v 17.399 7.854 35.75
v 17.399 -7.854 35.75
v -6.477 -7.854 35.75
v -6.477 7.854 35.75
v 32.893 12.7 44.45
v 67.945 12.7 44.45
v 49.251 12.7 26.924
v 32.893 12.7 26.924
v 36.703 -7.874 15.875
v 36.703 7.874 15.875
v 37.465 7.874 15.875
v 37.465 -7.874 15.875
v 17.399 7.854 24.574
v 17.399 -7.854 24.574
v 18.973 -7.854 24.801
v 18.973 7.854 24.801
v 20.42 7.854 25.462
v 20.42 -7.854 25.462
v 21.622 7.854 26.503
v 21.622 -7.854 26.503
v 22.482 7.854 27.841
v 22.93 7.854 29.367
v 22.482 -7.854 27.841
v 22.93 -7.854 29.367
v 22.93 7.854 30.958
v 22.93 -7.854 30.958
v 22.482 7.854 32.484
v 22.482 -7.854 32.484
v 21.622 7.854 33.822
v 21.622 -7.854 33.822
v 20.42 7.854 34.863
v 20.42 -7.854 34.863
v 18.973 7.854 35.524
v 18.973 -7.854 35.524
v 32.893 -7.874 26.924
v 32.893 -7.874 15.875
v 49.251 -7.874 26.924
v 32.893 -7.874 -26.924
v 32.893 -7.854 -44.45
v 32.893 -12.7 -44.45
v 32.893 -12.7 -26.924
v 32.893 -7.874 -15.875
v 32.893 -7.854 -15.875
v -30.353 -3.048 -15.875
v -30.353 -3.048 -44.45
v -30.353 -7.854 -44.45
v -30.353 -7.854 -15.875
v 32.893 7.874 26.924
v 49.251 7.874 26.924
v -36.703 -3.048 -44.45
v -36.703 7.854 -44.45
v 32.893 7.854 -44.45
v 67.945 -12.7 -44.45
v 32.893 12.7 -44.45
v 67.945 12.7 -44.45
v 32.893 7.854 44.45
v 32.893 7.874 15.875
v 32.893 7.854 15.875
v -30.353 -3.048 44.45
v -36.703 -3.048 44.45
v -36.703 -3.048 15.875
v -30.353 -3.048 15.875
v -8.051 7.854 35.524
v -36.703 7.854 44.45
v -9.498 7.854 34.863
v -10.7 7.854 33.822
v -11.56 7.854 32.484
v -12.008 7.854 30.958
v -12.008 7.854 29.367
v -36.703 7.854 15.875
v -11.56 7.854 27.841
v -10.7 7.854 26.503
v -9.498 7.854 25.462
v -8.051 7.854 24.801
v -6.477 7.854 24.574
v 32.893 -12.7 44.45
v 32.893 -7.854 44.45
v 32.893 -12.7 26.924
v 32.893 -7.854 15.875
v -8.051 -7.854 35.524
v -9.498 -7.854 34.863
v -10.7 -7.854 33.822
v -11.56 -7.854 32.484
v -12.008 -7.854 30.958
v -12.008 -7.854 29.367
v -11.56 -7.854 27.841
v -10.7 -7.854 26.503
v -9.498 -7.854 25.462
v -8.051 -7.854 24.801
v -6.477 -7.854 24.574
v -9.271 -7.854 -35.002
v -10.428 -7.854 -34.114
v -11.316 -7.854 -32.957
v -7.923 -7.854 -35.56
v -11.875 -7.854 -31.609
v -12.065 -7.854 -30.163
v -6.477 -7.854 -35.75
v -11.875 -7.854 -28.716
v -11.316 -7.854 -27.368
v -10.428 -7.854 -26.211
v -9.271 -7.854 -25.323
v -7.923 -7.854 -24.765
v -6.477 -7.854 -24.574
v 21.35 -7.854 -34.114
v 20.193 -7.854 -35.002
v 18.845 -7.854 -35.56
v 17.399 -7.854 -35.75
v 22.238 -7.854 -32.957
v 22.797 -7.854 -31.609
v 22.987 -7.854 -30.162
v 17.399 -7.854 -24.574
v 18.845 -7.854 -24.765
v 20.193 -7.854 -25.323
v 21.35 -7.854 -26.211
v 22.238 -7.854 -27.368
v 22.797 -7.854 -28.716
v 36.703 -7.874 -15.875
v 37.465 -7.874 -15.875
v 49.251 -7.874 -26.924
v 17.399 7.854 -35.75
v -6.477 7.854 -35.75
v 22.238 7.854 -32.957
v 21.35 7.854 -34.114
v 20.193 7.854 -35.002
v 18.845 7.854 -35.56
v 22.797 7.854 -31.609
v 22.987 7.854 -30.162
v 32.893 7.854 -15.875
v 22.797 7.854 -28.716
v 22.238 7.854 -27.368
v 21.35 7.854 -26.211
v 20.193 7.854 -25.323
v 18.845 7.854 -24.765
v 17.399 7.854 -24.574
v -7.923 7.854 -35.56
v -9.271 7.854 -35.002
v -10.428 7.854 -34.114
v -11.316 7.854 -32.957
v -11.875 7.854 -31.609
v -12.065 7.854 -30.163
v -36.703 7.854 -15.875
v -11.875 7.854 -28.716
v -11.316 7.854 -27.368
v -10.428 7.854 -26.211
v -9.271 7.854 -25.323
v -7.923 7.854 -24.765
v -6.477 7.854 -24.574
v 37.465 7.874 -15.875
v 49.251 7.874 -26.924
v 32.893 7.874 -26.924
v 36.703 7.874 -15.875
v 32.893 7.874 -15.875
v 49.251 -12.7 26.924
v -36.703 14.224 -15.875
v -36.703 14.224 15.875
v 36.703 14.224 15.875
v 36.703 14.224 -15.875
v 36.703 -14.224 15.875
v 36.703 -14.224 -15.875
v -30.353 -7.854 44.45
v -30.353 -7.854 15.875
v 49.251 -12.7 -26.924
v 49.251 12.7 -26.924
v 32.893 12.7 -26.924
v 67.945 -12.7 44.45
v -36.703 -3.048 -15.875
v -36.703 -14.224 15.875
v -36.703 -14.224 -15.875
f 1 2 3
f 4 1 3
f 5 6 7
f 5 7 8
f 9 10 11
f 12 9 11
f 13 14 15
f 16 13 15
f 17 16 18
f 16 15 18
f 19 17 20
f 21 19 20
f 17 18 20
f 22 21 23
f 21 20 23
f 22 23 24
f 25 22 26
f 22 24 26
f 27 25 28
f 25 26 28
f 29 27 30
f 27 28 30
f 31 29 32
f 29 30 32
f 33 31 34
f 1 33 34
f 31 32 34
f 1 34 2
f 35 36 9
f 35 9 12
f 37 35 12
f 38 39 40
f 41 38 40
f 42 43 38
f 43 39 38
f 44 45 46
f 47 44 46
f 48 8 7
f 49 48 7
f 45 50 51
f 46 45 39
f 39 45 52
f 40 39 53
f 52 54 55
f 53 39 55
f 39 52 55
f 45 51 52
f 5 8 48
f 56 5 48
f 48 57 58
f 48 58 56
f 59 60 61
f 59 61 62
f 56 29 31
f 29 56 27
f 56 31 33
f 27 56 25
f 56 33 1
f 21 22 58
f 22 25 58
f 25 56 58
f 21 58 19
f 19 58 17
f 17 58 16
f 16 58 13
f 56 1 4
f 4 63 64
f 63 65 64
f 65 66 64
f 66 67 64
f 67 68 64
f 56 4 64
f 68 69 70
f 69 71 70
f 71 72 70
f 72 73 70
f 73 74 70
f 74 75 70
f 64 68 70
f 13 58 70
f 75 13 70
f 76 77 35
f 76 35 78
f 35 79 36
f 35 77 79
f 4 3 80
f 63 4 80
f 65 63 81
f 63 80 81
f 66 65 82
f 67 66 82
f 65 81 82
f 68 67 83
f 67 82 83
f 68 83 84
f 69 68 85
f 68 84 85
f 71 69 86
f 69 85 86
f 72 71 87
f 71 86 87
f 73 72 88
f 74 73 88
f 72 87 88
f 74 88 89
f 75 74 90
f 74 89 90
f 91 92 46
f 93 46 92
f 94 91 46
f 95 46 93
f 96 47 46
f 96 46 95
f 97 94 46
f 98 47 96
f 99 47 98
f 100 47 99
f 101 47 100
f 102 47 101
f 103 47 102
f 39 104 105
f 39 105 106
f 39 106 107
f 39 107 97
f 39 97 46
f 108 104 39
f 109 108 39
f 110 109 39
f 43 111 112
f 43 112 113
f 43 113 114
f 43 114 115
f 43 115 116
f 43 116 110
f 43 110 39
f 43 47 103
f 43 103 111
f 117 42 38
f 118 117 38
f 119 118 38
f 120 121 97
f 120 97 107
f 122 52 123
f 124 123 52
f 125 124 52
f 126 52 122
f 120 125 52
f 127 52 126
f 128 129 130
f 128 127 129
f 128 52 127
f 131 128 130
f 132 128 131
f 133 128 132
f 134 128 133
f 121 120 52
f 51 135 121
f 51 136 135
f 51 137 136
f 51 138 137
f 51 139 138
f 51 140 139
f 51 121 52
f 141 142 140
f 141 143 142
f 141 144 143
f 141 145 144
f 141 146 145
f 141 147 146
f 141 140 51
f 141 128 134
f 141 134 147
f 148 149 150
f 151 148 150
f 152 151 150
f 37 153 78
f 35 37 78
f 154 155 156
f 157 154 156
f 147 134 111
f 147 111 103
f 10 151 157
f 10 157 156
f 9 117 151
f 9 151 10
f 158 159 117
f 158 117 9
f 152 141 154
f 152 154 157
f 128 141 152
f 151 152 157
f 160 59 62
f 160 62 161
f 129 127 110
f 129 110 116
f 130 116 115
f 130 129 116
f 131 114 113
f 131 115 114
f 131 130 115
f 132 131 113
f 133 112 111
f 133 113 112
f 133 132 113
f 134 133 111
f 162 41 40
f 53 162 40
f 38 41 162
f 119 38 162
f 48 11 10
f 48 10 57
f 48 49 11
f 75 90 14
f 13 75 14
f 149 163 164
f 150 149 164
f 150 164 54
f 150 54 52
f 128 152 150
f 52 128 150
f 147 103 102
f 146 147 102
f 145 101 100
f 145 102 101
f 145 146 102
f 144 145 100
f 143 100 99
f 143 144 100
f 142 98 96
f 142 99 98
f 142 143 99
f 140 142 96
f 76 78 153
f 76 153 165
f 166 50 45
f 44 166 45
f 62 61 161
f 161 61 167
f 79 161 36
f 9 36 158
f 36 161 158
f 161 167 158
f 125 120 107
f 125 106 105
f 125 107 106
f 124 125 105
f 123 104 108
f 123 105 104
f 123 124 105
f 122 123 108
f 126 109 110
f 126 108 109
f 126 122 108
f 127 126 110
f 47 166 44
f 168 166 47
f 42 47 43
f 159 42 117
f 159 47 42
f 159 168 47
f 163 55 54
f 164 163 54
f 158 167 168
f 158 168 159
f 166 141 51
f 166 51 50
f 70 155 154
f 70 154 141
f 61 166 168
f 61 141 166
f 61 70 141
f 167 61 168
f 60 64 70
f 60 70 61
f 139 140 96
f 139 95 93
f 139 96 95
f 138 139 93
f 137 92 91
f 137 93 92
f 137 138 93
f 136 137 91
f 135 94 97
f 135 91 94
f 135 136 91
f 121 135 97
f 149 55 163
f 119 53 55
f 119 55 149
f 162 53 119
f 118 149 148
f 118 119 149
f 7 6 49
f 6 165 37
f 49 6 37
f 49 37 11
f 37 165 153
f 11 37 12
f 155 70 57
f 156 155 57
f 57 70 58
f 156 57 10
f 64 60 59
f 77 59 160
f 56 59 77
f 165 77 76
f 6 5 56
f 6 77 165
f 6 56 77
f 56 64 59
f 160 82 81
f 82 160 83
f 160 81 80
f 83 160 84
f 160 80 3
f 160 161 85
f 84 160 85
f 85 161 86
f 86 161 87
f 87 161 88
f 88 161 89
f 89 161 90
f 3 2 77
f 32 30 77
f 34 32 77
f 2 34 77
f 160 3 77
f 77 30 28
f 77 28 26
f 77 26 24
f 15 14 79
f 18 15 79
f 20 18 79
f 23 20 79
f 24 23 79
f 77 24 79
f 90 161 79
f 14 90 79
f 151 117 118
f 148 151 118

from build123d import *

# Parameters (mm, degrees)
F0_W      = 73.406
F0_H      = 31.75
F1_DEPTH  = 14.224
F3_DEPTH  = 28.575
F5_DEPTH  = 25.4
F8_DEPTH  = 12.7
F10_DEPTH = 4.826
F12_DEPTH = 4.826


with BuildPart() as f1:
    # F0 (on Front) → F1 (new body, symmetric)
    with BuildSketch(Plane.XZ):
        Rectangle(F0_W, F0_H)
    extrude(amount=F1_DEPTH, both=True)

    # F2 (on face) → F3 (join)
    with BuildSketch(Plane.XY.offset(15.875)):
        Polygon((-36.703, 7.854131), (-36.703, -3.048), (-30.353, -3.048), (-30.353, -7.854131), (32.893, -7.854131), (32.893, -12.7), (67.945, -12.7), (67.945, 12.7), (32.893, 12.7), (32.893, 7.854131), align=None)
    extrude(amount=F3_DEPTH)

    # F4 (on face) → F5 (cut)
    with BuildSketch(Plane.XZ.offset(12.7)):
        Polygon((67.945, 44.45), (37.465, 15.875), (67.945, 15.875), align=None)
    extrude(amount=-F5_DEPTH, mode=Mode.SUBTRACT)

    # F6: F1 across plane


with BuildPart() as f1_1:
    add(f1.part)
    add(f1.part.mirror(Plane.XY))

    # F7 (on Front) → F8 (cut, symmetric)
    with BuildSketch(Plane.XZ):
        with BuildLine():
            ThreePointArc((-6.477, -24.5745), (-10.428313, -26.211187), (-12.065, -30.1625))
            Line((-12.065, -30.1625), (22.987, -30.1625))
            ThreePointArc((22.987, -30.1625), (21.350313, -26.211187), (17.399, -24.5745))
            Line((17.399, -24.5745), (-6.477, -24.5745))
        make_face()
        with BuildLine():
            Line((22.987, -30.1625), (-12.065, -30.1625))
            ThreePointArc((-12.065, -30.1625), (-10.428313, -34.113813), (-6.477, -35.7505))
            Line((-6.477, -35.7505), (17.399, -35.7505))
            ThreePointArc((17.399, -35.7505), (21.350313, -34.113813), (22.987, -30.1625))
        make_face()
        with BuildLine():
            ThreePointArc((-6.477, 35.7505), (-12.065, 30.1625), (-6.477, 24.5745))
            Line((-6.477, 24.5745), (17.399, 24.5745))
            ThreePointArc((17.399, 24.5745), (22.987, 30.1625), (17.399, 35.7505))
            Line((17.399, 35.7505), (-6.477, 35.7505))
        make_face()
    extrude(amount=F8_DEPTH, both=True, mode=Mode.SUBTRACT)

    # F9 (on face) → F10 (cut)
    with BuildSketch(Plane.XZ.offset(12.7)):
        Polygon((32.893, -15.875), (32.893, -26.924), (49.2506, -26.924), (37.465, -15.875), align=None)
        Polygon((37.465, 15.875), (49.2506, 26.924), (32.893, 26.924), (32.893, 15.875), align=None)
    extrude(amount=-F10_DEPTH, mode=Mode.SUBTRACT)

    # F11 (on face) → F12 (cut)
    with BuildSketch(Plane(origin=(0, 12.7, 0), x_dir=(-1, 0, 0), z_dir=(0, 1, 0))):
        Polygon((-49.2506, -26.924), (-32.893, -26.924), (-32.893, -15.875), (-36.703, -15.875), (-37.465, -15.875), align=None)
        Polygon((-37.465, 15.875), (-36.703, 15.875), (-32.893, 15.875), (-32.893, 26.924), (-49.2506, 26.924), align=None)
    extrude(amount=-F12_DEPTH, mode=Mode.SUBTRACT)


solid = f1_1.part
